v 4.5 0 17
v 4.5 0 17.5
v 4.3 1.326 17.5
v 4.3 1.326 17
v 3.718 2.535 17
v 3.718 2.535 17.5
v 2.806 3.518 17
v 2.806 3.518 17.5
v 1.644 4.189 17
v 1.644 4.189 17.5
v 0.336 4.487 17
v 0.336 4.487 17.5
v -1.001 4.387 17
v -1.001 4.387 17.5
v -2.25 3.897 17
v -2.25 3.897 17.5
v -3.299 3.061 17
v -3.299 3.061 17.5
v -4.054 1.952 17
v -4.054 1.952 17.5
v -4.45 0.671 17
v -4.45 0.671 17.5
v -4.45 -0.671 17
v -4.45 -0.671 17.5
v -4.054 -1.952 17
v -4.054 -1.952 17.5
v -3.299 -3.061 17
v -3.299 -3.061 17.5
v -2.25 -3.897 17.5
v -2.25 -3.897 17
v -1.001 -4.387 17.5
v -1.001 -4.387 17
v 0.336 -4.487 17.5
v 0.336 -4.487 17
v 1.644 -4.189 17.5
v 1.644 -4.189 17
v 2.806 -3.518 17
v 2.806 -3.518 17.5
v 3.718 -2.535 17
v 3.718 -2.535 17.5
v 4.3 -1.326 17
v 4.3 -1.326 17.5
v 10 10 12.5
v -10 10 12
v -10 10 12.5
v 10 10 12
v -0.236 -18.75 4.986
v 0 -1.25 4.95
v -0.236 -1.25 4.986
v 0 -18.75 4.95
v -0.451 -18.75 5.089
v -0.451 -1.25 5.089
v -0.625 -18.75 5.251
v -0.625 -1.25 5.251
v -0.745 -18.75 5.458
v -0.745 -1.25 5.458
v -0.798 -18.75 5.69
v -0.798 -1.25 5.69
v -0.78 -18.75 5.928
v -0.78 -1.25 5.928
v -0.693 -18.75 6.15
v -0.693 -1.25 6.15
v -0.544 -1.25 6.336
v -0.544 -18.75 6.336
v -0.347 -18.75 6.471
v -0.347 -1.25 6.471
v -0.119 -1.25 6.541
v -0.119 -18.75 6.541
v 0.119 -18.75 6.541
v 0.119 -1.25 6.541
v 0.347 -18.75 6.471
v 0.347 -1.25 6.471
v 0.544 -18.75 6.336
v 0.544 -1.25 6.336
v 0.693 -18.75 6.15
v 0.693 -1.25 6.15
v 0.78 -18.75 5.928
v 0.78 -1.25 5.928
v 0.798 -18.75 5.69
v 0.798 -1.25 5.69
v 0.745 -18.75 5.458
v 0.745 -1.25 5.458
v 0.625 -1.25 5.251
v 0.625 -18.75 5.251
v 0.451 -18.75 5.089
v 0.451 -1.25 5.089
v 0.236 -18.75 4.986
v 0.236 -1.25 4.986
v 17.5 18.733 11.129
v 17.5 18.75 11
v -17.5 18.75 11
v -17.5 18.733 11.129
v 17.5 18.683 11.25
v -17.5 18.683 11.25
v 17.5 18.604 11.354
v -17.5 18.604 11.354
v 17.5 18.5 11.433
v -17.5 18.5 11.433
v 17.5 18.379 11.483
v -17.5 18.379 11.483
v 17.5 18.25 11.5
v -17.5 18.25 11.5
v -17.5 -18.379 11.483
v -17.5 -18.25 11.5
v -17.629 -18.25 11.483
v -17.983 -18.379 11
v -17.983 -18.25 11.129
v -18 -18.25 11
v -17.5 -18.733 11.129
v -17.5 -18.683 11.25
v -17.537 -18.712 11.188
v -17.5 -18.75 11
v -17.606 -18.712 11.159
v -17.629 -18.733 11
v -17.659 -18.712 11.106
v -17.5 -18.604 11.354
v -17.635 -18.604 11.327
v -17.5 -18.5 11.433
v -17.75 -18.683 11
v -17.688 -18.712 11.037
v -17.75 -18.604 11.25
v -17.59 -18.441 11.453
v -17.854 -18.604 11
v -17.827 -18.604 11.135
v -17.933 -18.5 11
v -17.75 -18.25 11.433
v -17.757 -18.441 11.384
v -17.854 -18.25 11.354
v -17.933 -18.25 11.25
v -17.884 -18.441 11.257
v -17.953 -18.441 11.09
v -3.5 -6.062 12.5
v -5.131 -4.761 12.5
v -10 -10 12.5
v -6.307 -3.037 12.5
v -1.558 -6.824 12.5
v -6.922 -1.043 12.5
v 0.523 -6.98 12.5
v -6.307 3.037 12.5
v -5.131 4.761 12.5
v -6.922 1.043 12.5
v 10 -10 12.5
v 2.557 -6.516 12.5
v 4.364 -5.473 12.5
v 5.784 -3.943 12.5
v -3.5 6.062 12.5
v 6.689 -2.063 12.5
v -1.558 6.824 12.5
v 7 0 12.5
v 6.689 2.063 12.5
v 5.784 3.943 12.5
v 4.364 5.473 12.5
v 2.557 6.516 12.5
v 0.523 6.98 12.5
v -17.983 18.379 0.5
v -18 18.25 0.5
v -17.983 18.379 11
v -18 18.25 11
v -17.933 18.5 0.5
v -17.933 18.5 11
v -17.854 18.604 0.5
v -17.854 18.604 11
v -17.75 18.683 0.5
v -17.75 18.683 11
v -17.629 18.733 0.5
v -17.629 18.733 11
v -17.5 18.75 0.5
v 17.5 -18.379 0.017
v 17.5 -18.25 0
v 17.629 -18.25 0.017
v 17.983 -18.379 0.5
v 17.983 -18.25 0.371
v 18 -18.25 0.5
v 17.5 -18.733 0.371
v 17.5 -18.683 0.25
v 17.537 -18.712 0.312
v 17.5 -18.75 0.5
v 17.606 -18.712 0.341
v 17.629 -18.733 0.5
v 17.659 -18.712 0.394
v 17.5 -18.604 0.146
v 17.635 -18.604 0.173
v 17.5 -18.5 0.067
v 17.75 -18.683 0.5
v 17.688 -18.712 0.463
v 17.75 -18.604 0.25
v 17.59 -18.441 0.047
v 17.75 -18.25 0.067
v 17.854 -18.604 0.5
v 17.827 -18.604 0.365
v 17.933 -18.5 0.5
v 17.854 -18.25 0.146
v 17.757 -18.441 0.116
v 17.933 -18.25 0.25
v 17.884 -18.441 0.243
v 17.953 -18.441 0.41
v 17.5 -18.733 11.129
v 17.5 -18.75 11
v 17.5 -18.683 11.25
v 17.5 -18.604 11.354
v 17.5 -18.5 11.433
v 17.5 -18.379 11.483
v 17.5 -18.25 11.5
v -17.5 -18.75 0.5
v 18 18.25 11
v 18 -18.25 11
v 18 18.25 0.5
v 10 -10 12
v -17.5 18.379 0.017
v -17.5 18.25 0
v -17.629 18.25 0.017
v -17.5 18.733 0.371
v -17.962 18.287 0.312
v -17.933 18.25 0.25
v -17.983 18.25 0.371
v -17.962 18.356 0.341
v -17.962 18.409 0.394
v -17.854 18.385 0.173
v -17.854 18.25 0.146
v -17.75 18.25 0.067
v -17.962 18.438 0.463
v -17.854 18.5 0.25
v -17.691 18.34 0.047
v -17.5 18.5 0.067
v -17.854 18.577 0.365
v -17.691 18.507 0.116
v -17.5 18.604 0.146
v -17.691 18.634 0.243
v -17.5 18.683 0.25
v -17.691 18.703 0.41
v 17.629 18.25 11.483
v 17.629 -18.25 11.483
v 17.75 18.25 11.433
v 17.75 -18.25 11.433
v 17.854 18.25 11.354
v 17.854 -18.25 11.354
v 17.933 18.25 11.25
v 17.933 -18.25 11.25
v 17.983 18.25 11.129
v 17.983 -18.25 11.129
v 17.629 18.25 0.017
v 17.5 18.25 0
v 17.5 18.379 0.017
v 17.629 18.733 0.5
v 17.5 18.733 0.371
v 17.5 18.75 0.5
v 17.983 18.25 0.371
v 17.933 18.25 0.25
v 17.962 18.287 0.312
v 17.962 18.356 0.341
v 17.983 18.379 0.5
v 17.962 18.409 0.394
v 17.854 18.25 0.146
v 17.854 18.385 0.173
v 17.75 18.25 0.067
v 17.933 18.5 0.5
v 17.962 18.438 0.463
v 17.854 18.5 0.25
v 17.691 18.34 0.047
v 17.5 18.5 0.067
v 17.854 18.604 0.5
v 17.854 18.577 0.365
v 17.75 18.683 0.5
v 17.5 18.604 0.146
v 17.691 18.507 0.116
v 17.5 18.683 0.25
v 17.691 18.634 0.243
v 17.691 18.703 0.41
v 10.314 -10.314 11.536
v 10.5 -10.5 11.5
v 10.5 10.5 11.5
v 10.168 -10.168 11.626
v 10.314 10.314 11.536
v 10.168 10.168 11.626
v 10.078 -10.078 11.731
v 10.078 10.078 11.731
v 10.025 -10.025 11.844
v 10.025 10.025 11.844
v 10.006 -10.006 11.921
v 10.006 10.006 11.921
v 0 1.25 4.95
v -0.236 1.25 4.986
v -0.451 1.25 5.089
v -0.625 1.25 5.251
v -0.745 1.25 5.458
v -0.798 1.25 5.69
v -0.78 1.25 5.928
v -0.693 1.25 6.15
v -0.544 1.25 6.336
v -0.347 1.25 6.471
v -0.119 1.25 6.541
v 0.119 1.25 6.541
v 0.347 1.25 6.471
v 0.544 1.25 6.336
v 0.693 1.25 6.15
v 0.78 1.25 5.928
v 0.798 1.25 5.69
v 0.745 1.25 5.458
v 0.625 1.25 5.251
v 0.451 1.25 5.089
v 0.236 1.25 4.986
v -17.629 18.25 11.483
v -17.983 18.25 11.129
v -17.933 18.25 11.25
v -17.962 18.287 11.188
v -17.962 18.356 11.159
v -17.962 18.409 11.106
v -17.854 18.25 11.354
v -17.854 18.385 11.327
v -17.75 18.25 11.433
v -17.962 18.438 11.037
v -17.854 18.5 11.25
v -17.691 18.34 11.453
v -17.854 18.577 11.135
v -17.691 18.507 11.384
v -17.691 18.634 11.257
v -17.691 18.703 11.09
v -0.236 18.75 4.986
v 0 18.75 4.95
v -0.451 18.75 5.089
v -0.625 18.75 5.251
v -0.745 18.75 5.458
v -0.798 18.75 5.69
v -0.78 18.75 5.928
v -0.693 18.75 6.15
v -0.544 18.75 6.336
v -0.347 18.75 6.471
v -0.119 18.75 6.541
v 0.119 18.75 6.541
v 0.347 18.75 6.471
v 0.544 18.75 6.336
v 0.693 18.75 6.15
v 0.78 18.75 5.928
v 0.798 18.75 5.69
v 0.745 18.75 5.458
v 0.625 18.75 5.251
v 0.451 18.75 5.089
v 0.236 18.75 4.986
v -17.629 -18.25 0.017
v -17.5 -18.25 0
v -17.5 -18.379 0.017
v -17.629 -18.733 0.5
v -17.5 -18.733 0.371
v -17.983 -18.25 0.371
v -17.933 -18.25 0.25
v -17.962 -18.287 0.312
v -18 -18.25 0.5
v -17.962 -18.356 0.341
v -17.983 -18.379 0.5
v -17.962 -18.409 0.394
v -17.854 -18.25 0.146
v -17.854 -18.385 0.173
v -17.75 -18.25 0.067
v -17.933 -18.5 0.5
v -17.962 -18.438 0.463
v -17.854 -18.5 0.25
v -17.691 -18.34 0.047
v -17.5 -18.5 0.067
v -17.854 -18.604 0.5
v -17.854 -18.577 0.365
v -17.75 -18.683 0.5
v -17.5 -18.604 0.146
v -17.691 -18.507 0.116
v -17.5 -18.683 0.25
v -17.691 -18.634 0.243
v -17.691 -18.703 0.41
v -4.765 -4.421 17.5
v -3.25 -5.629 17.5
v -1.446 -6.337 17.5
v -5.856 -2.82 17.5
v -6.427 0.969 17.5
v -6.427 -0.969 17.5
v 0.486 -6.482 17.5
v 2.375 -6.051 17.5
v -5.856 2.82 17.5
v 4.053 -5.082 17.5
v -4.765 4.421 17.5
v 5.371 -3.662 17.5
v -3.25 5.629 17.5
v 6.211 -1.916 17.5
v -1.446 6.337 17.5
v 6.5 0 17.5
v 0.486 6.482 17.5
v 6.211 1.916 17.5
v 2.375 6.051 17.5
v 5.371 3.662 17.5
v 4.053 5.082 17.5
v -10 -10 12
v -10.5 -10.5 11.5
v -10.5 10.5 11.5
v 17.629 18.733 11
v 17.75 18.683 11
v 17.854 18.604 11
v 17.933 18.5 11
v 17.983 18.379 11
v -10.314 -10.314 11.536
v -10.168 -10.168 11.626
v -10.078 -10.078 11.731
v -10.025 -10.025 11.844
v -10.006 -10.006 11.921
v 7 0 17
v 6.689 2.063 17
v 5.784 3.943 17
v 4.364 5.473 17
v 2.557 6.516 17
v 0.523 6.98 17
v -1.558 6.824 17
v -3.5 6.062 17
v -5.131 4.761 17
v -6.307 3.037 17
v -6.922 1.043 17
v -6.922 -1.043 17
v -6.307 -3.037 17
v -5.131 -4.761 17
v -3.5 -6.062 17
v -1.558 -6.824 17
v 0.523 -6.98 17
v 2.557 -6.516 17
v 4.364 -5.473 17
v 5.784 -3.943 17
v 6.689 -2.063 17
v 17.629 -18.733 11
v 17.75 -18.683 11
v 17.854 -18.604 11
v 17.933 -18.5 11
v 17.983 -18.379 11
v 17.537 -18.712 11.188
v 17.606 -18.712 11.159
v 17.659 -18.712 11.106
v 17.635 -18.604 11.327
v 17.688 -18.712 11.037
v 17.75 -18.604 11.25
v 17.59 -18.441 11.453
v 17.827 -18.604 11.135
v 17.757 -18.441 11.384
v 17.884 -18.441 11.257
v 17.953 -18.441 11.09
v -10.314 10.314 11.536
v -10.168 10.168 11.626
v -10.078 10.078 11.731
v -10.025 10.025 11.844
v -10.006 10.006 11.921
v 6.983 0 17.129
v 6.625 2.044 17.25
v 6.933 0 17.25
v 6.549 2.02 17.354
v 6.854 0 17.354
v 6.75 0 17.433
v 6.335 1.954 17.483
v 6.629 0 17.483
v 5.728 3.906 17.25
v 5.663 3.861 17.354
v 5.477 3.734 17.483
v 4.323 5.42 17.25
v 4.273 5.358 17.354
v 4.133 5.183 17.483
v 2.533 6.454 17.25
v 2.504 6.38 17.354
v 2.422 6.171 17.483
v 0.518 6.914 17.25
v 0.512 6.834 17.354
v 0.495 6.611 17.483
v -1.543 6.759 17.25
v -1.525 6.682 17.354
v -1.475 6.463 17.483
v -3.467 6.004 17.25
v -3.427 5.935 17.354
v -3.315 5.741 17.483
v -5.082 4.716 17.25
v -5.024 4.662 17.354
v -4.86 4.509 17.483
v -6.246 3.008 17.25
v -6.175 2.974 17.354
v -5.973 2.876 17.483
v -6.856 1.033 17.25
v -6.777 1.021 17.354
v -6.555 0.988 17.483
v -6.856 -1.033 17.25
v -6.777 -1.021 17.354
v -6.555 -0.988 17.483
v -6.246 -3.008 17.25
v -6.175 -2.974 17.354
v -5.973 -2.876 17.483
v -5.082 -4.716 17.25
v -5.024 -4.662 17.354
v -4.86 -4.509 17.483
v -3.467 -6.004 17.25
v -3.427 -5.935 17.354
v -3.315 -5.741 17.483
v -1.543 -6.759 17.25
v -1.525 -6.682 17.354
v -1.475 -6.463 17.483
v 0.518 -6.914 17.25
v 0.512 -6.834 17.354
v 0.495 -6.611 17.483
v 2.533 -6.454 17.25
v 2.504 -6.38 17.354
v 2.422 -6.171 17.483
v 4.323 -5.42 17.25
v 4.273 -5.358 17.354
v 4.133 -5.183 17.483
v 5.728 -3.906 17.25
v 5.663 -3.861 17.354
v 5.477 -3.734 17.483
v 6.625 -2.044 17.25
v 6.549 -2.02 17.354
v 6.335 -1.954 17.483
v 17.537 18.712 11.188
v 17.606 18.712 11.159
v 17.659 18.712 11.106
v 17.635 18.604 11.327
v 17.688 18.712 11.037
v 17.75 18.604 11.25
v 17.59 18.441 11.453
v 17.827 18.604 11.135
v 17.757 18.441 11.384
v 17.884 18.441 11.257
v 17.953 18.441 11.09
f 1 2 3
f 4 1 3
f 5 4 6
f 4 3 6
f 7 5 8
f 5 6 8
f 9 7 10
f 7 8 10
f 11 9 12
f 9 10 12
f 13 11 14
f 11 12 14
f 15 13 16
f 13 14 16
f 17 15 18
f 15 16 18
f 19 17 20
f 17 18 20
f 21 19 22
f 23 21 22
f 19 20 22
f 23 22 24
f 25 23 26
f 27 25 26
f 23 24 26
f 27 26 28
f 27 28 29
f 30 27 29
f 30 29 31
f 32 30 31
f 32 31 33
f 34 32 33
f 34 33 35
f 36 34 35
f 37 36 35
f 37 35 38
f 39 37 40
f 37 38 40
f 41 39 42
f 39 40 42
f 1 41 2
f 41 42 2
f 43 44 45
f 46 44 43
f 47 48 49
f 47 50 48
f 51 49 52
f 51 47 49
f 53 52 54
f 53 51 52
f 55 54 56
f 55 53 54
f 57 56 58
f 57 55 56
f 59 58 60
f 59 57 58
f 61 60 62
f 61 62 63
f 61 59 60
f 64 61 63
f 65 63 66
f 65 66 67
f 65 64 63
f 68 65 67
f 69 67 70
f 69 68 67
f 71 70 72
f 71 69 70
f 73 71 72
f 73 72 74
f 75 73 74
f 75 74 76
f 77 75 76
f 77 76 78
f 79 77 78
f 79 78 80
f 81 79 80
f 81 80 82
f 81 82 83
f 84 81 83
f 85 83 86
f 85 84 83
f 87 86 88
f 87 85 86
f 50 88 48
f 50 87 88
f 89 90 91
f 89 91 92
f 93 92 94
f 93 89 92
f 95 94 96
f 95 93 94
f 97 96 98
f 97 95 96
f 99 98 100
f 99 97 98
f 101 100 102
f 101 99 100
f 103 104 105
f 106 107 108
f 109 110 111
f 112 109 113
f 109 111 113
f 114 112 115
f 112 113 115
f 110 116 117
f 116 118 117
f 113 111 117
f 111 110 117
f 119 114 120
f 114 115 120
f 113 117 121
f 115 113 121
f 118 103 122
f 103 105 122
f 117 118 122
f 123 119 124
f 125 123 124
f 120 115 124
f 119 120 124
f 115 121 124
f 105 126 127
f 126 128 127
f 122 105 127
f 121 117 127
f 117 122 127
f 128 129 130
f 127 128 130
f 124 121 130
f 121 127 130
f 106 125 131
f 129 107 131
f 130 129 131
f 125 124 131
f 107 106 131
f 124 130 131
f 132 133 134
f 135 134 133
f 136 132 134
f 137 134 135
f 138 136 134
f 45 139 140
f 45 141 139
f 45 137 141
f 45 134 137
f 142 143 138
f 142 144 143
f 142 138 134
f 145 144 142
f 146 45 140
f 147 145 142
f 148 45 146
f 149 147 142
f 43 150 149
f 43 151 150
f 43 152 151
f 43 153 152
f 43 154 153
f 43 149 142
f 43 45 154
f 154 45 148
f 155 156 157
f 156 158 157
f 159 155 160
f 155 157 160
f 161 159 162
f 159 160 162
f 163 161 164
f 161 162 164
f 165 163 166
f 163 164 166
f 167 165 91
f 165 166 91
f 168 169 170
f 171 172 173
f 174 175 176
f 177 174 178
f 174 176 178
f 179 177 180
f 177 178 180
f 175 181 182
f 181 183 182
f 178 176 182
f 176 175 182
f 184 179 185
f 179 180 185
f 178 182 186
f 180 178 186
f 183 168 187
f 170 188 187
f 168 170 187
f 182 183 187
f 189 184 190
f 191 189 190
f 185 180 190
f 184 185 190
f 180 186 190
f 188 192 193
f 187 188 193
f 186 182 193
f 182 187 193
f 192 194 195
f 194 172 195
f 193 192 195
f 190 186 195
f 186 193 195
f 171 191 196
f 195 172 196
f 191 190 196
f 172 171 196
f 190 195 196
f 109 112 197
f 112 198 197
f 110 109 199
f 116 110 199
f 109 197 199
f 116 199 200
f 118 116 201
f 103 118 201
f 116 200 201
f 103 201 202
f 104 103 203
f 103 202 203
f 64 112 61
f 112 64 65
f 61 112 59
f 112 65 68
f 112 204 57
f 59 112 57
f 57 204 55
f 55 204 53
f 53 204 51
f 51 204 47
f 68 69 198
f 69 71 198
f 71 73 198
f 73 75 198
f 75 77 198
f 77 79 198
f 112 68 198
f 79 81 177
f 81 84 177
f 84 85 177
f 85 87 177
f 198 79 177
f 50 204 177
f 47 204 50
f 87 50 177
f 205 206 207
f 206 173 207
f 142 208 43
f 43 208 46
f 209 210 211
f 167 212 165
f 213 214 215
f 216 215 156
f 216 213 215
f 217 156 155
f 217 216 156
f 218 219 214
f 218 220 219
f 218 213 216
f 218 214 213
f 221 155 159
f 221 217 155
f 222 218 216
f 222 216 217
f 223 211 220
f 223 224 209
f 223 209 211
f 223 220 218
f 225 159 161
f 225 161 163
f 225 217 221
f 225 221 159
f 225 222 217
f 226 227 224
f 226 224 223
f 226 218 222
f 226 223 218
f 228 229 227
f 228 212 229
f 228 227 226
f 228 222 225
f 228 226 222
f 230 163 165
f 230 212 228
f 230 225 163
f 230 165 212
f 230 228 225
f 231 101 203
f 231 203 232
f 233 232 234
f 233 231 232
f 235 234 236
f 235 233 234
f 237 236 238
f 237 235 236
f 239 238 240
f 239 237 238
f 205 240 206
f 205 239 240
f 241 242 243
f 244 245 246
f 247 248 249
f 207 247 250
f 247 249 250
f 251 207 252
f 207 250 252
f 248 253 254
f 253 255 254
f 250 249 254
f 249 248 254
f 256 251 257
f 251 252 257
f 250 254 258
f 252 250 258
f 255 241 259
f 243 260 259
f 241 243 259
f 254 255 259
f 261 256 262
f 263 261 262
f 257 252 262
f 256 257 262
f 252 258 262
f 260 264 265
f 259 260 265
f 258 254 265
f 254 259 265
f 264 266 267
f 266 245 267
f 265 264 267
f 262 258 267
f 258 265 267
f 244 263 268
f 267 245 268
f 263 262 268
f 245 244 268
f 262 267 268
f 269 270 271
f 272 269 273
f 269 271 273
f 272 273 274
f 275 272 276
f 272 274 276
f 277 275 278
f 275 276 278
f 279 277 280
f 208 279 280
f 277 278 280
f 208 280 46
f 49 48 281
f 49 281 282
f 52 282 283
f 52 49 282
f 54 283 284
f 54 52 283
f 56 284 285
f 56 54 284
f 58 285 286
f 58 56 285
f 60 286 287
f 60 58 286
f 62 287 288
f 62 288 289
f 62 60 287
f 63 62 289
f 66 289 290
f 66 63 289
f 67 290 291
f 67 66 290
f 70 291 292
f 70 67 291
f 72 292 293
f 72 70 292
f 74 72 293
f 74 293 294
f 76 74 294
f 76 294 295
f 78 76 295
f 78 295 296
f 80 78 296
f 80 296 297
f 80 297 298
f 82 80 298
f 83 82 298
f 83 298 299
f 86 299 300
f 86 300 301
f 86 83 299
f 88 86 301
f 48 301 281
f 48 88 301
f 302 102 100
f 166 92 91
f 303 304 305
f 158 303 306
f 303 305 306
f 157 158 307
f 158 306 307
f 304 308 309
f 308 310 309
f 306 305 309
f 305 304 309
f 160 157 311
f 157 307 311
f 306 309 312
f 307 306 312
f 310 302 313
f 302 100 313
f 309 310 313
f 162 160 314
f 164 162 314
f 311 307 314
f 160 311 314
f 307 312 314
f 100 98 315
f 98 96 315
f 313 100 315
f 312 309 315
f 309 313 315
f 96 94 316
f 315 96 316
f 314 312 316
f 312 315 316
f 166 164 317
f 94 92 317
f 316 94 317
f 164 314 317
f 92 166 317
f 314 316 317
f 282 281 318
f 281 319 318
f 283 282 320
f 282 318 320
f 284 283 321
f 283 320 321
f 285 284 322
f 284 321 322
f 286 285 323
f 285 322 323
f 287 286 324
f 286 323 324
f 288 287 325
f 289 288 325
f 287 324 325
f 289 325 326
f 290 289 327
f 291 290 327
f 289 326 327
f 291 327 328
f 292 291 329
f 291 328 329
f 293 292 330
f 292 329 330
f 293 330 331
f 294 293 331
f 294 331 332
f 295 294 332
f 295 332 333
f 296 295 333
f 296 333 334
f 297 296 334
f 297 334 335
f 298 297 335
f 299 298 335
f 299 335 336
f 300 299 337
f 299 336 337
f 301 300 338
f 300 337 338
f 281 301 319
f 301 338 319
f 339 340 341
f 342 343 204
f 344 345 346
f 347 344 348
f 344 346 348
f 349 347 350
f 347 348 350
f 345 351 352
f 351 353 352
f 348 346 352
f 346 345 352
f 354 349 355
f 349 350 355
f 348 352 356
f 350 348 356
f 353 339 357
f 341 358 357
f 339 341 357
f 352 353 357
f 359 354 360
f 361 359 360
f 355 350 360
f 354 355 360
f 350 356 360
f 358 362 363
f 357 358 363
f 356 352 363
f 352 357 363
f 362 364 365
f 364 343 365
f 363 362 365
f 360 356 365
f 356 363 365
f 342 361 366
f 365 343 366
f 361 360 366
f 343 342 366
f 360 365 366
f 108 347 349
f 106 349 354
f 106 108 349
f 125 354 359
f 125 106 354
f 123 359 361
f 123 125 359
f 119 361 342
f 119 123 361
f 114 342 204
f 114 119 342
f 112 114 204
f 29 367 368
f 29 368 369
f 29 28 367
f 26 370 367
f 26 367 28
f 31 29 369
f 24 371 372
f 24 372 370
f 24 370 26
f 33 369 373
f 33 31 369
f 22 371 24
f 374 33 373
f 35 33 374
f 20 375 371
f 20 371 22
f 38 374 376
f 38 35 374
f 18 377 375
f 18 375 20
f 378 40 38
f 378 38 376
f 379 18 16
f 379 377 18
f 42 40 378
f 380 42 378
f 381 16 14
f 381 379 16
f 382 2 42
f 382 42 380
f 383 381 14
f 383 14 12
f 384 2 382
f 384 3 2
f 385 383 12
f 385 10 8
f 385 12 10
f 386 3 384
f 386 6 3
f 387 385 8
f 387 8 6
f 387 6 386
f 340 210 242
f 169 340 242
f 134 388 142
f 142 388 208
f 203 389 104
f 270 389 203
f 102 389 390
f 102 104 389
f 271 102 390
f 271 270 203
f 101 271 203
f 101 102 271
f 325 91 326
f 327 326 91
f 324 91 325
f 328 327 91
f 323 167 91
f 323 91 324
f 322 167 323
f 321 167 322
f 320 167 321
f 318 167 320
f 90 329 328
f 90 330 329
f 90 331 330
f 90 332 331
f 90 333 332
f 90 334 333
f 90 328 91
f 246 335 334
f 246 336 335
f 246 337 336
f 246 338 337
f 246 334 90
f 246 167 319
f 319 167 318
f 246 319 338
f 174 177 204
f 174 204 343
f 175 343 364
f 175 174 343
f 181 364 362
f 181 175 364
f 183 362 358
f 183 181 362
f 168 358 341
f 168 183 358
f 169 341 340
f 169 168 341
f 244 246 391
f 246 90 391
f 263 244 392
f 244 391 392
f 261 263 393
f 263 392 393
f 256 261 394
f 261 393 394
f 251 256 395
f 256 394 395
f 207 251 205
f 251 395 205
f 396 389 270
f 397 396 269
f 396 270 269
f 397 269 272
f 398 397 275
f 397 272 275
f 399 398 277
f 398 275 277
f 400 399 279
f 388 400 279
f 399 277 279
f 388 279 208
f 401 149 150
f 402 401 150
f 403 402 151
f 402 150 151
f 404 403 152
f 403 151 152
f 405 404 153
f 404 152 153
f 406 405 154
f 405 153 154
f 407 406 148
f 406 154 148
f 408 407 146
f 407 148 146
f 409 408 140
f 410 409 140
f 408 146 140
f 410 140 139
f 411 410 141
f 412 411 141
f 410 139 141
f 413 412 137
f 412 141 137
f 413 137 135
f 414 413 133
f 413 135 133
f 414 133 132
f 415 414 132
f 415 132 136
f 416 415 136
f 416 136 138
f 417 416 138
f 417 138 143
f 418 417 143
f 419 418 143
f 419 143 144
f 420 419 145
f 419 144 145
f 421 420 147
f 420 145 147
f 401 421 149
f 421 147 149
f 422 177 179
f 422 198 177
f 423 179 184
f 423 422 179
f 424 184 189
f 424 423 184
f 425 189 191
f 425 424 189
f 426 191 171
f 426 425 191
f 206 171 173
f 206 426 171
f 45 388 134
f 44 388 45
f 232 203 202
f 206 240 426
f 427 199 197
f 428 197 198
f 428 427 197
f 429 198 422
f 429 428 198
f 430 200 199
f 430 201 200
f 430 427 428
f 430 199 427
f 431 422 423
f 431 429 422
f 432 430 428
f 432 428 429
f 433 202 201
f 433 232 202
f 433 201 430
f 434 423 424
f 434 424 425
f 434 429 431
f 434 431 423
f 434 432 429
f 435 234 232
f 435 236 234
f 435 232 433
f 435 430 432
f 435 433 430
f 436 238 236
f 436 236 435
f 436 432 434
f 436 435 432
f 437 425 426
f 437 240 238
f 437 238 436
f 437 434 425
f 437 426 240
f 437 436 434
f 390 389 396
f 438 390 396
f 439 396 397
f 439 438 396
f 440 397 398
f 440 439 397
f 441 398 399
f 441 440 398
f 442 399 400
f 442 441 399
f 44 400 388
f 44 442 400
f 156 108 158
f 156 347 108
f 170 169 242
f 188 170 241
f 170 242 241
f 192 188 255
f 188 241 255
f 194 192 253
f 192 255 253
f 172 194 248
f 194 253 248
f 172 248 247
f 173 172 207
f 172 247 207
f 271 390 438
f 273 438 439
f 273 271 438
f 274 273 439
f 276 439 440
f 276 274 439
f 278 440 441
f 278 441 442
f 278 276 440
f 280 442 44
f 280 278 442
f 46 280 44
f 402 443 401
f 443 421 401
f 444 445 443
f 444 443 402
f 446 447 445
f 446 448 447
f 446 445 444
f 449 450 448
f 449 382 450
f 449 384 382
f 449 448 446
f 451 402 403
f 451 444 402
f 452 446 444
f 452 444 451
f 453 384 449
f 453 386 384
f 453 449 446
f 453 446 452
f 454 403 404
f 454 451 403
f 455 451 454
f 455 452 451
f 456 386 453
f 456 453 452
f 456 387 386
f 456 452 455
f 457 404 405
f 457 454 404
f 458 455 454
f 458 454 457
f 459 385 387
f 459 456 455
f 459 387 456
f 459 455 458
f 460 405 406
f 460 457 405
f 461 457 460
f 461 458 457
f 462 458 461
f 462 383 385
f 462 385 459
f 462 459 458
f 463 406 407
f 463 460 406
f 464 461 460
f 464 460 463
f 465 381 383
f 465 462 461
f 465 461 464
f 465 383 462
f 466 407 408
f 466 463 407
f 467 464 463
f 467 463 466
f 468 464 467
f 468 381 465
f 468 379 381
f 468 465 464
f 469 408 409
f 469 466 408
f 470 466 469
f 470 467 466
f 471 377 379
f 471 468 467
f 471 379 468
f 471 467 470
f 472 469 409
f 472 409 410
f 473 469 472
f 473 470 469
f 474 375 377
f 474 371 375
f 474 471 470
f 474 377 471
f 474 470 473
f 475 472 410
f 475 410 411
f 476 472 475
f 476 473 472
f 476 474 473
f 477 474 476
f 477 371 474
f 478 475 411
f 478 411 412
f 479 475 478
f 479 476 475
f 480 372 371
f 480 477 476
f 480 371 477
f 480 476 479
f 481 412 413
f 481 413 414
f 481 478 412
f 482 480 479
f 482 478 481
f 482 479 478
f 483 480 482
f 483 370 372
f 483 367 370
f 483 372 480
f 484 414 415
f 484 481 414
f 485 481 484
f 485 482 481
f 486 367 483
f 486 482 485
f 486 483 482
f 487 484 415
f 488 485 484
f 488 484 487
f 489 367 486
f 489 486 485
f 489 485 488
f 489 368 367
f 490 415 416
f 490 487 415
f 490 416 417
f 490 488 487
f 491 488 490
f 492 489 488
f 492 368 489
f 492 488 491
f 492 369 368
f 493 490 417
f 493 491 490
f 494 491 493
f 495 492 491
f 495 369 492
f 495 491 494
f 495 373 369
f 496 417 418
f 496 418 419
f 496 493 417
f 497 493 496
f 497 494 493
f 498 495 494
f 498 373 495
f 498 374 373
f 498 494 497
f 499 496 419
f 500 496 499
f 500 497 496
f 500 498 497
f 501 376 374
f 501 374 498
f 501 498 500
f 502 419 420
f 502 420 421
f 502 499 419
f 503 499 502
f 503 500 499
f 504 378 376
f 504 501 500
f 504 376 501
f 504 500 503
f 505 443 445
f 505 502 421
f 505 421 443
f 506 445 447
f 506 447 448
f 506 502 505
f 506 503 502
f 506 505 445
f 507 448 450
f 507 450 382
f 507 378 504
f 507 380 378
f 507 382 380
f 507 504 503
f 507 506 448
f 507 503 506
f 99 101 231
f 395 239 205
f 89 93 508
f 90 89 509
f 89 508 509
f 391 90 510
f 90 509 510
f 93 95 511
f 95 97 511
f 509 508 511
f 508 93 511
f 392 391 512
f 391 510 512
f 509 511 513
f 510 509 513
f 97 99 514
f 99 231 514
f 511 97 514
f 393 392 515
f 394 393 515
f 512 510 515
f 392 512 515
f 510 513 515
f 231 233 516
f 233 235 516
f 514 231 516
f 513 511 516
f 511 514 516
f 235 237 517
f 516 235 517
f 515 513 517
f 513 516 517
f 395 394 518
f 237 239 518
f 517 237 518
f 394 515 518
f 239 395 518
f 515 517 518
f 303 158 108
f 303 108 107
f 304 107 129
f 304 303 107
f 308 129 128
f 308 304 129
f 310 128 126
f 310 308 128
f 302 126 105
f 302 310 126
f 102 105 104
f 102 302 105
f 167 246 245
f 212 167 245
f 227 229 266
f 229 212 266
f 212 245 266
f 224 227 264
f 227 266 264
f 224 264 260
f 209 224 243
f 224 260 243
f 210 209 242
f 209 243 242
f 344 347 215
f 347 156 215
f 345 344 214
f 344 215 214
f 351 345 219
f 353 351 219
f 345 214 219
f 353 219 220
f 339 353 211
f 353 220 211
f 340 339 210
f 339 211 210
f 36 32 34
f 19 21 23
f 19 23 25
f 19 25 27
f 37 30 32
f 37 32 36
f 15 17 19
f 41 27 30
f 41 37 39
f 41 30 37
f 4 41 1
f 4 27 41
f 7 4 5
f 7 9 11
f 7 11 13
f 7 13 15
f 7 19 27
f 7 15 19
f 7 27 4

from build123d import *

# Parameters (mm, degrees)
SKETCH_1_W          = 36
SKETCH_1_H          = 37.5
EXTRUDE_1_DEPTH     = 11.5
SKETCH_2_W          = 20
SKETCH_2_H          = 20
EXTRUDE_2_DEPTH     = 1
SKETCH_3_R          = 7
EXTRUDE_3_DEPTH     = 5
FILLET_1_R          = 0.5
SKETCH_4_R          = 4.5
CUT_EXTRUDE_1_DEPTH = 0.5


with BuildPart() as part:
    # 草图1 → 凸台-拉伸1 (new body)
    with BuildSketch(Plane.XY):
        Rectangle(SKETCH_1_W, SKETCH_1_H)
    extrude(amount=EXTRUDE_1_DEPTH)

    # 草图2 → 凸台-拉伸2 (add)
    with BuildSketch(Plane.XY.offset(11.5)):
        Rectangle(SKETCH_2_W, SKETCH_2_H)
    extrude(amount=EXTRUDE_2_DEPTH)

    # 草图3 → 凸台-拉伸3 (add)
    with BuildSketch(Plane.XY.offset(12.5)):
        Circle(SKETCH_3_R)
    extrude(amount=EXTRUDE_3_DEPTH)

    # 圆角1
    fillet_1_edges = [part.edges().sort_by_distance(p)[0] for p in [
        (18, 0, 11.5),
        (0, 18.75, 11.5),
        (-10, 0, 11.5),
        (0, -10, 11.5),
        (10, 0, 11.5),
        (0, 10, 11.5),
        (-7, 0, 17.5),
        (-18, 0, 11.5),
        (0, 18.75, 0),
        (18, 0, 0),
        (0, -18.75, 0),
        (-18, 0, 0),
        (0, -18.75, 11.5),
        (-18, 18.75, 5.75),
        (18, 18.75, 5.75),
        (18, -18.75, 5.75),
        (-18, -18.75, 5.75),
    ]]
    fillet(fillet_1_edges, radius=FILLET_1_R)

    # 草图4 → 切除-拉伸1 (cut)
    with BuildSketch(Plane.XY.offset(17.5)):
        Circle(SKETCH_4_R)
    extrude(amount=-CUT_EXTRUDE_1_DEPTH, mode=Mode.SUBTRACT)

    # 草图6 → M2 螺纹孔1 (revolve, cut)
    with BuildSketch(Plane(origin=(0, -18.75, 5.75), x_dir=(0, 0, -1), z_dir=(1, 0, 0))):
        Polygon((0, 0), (0, 20.480688495), (0.8, 20), (0.8, 0), align=None)
    hole_wizard_m2_1 = revolve(axis=Axis((0, -25.1, 5.75), (0, 1, 0)), mode=Mode.SUBTRACT)

    # 镜向1: M2 螺纹孔1 across plane
    add(hole_wizard_m2_1.mirror(Plane.ZX), mode=Mode.SUBTRACT)


solid = part.part
